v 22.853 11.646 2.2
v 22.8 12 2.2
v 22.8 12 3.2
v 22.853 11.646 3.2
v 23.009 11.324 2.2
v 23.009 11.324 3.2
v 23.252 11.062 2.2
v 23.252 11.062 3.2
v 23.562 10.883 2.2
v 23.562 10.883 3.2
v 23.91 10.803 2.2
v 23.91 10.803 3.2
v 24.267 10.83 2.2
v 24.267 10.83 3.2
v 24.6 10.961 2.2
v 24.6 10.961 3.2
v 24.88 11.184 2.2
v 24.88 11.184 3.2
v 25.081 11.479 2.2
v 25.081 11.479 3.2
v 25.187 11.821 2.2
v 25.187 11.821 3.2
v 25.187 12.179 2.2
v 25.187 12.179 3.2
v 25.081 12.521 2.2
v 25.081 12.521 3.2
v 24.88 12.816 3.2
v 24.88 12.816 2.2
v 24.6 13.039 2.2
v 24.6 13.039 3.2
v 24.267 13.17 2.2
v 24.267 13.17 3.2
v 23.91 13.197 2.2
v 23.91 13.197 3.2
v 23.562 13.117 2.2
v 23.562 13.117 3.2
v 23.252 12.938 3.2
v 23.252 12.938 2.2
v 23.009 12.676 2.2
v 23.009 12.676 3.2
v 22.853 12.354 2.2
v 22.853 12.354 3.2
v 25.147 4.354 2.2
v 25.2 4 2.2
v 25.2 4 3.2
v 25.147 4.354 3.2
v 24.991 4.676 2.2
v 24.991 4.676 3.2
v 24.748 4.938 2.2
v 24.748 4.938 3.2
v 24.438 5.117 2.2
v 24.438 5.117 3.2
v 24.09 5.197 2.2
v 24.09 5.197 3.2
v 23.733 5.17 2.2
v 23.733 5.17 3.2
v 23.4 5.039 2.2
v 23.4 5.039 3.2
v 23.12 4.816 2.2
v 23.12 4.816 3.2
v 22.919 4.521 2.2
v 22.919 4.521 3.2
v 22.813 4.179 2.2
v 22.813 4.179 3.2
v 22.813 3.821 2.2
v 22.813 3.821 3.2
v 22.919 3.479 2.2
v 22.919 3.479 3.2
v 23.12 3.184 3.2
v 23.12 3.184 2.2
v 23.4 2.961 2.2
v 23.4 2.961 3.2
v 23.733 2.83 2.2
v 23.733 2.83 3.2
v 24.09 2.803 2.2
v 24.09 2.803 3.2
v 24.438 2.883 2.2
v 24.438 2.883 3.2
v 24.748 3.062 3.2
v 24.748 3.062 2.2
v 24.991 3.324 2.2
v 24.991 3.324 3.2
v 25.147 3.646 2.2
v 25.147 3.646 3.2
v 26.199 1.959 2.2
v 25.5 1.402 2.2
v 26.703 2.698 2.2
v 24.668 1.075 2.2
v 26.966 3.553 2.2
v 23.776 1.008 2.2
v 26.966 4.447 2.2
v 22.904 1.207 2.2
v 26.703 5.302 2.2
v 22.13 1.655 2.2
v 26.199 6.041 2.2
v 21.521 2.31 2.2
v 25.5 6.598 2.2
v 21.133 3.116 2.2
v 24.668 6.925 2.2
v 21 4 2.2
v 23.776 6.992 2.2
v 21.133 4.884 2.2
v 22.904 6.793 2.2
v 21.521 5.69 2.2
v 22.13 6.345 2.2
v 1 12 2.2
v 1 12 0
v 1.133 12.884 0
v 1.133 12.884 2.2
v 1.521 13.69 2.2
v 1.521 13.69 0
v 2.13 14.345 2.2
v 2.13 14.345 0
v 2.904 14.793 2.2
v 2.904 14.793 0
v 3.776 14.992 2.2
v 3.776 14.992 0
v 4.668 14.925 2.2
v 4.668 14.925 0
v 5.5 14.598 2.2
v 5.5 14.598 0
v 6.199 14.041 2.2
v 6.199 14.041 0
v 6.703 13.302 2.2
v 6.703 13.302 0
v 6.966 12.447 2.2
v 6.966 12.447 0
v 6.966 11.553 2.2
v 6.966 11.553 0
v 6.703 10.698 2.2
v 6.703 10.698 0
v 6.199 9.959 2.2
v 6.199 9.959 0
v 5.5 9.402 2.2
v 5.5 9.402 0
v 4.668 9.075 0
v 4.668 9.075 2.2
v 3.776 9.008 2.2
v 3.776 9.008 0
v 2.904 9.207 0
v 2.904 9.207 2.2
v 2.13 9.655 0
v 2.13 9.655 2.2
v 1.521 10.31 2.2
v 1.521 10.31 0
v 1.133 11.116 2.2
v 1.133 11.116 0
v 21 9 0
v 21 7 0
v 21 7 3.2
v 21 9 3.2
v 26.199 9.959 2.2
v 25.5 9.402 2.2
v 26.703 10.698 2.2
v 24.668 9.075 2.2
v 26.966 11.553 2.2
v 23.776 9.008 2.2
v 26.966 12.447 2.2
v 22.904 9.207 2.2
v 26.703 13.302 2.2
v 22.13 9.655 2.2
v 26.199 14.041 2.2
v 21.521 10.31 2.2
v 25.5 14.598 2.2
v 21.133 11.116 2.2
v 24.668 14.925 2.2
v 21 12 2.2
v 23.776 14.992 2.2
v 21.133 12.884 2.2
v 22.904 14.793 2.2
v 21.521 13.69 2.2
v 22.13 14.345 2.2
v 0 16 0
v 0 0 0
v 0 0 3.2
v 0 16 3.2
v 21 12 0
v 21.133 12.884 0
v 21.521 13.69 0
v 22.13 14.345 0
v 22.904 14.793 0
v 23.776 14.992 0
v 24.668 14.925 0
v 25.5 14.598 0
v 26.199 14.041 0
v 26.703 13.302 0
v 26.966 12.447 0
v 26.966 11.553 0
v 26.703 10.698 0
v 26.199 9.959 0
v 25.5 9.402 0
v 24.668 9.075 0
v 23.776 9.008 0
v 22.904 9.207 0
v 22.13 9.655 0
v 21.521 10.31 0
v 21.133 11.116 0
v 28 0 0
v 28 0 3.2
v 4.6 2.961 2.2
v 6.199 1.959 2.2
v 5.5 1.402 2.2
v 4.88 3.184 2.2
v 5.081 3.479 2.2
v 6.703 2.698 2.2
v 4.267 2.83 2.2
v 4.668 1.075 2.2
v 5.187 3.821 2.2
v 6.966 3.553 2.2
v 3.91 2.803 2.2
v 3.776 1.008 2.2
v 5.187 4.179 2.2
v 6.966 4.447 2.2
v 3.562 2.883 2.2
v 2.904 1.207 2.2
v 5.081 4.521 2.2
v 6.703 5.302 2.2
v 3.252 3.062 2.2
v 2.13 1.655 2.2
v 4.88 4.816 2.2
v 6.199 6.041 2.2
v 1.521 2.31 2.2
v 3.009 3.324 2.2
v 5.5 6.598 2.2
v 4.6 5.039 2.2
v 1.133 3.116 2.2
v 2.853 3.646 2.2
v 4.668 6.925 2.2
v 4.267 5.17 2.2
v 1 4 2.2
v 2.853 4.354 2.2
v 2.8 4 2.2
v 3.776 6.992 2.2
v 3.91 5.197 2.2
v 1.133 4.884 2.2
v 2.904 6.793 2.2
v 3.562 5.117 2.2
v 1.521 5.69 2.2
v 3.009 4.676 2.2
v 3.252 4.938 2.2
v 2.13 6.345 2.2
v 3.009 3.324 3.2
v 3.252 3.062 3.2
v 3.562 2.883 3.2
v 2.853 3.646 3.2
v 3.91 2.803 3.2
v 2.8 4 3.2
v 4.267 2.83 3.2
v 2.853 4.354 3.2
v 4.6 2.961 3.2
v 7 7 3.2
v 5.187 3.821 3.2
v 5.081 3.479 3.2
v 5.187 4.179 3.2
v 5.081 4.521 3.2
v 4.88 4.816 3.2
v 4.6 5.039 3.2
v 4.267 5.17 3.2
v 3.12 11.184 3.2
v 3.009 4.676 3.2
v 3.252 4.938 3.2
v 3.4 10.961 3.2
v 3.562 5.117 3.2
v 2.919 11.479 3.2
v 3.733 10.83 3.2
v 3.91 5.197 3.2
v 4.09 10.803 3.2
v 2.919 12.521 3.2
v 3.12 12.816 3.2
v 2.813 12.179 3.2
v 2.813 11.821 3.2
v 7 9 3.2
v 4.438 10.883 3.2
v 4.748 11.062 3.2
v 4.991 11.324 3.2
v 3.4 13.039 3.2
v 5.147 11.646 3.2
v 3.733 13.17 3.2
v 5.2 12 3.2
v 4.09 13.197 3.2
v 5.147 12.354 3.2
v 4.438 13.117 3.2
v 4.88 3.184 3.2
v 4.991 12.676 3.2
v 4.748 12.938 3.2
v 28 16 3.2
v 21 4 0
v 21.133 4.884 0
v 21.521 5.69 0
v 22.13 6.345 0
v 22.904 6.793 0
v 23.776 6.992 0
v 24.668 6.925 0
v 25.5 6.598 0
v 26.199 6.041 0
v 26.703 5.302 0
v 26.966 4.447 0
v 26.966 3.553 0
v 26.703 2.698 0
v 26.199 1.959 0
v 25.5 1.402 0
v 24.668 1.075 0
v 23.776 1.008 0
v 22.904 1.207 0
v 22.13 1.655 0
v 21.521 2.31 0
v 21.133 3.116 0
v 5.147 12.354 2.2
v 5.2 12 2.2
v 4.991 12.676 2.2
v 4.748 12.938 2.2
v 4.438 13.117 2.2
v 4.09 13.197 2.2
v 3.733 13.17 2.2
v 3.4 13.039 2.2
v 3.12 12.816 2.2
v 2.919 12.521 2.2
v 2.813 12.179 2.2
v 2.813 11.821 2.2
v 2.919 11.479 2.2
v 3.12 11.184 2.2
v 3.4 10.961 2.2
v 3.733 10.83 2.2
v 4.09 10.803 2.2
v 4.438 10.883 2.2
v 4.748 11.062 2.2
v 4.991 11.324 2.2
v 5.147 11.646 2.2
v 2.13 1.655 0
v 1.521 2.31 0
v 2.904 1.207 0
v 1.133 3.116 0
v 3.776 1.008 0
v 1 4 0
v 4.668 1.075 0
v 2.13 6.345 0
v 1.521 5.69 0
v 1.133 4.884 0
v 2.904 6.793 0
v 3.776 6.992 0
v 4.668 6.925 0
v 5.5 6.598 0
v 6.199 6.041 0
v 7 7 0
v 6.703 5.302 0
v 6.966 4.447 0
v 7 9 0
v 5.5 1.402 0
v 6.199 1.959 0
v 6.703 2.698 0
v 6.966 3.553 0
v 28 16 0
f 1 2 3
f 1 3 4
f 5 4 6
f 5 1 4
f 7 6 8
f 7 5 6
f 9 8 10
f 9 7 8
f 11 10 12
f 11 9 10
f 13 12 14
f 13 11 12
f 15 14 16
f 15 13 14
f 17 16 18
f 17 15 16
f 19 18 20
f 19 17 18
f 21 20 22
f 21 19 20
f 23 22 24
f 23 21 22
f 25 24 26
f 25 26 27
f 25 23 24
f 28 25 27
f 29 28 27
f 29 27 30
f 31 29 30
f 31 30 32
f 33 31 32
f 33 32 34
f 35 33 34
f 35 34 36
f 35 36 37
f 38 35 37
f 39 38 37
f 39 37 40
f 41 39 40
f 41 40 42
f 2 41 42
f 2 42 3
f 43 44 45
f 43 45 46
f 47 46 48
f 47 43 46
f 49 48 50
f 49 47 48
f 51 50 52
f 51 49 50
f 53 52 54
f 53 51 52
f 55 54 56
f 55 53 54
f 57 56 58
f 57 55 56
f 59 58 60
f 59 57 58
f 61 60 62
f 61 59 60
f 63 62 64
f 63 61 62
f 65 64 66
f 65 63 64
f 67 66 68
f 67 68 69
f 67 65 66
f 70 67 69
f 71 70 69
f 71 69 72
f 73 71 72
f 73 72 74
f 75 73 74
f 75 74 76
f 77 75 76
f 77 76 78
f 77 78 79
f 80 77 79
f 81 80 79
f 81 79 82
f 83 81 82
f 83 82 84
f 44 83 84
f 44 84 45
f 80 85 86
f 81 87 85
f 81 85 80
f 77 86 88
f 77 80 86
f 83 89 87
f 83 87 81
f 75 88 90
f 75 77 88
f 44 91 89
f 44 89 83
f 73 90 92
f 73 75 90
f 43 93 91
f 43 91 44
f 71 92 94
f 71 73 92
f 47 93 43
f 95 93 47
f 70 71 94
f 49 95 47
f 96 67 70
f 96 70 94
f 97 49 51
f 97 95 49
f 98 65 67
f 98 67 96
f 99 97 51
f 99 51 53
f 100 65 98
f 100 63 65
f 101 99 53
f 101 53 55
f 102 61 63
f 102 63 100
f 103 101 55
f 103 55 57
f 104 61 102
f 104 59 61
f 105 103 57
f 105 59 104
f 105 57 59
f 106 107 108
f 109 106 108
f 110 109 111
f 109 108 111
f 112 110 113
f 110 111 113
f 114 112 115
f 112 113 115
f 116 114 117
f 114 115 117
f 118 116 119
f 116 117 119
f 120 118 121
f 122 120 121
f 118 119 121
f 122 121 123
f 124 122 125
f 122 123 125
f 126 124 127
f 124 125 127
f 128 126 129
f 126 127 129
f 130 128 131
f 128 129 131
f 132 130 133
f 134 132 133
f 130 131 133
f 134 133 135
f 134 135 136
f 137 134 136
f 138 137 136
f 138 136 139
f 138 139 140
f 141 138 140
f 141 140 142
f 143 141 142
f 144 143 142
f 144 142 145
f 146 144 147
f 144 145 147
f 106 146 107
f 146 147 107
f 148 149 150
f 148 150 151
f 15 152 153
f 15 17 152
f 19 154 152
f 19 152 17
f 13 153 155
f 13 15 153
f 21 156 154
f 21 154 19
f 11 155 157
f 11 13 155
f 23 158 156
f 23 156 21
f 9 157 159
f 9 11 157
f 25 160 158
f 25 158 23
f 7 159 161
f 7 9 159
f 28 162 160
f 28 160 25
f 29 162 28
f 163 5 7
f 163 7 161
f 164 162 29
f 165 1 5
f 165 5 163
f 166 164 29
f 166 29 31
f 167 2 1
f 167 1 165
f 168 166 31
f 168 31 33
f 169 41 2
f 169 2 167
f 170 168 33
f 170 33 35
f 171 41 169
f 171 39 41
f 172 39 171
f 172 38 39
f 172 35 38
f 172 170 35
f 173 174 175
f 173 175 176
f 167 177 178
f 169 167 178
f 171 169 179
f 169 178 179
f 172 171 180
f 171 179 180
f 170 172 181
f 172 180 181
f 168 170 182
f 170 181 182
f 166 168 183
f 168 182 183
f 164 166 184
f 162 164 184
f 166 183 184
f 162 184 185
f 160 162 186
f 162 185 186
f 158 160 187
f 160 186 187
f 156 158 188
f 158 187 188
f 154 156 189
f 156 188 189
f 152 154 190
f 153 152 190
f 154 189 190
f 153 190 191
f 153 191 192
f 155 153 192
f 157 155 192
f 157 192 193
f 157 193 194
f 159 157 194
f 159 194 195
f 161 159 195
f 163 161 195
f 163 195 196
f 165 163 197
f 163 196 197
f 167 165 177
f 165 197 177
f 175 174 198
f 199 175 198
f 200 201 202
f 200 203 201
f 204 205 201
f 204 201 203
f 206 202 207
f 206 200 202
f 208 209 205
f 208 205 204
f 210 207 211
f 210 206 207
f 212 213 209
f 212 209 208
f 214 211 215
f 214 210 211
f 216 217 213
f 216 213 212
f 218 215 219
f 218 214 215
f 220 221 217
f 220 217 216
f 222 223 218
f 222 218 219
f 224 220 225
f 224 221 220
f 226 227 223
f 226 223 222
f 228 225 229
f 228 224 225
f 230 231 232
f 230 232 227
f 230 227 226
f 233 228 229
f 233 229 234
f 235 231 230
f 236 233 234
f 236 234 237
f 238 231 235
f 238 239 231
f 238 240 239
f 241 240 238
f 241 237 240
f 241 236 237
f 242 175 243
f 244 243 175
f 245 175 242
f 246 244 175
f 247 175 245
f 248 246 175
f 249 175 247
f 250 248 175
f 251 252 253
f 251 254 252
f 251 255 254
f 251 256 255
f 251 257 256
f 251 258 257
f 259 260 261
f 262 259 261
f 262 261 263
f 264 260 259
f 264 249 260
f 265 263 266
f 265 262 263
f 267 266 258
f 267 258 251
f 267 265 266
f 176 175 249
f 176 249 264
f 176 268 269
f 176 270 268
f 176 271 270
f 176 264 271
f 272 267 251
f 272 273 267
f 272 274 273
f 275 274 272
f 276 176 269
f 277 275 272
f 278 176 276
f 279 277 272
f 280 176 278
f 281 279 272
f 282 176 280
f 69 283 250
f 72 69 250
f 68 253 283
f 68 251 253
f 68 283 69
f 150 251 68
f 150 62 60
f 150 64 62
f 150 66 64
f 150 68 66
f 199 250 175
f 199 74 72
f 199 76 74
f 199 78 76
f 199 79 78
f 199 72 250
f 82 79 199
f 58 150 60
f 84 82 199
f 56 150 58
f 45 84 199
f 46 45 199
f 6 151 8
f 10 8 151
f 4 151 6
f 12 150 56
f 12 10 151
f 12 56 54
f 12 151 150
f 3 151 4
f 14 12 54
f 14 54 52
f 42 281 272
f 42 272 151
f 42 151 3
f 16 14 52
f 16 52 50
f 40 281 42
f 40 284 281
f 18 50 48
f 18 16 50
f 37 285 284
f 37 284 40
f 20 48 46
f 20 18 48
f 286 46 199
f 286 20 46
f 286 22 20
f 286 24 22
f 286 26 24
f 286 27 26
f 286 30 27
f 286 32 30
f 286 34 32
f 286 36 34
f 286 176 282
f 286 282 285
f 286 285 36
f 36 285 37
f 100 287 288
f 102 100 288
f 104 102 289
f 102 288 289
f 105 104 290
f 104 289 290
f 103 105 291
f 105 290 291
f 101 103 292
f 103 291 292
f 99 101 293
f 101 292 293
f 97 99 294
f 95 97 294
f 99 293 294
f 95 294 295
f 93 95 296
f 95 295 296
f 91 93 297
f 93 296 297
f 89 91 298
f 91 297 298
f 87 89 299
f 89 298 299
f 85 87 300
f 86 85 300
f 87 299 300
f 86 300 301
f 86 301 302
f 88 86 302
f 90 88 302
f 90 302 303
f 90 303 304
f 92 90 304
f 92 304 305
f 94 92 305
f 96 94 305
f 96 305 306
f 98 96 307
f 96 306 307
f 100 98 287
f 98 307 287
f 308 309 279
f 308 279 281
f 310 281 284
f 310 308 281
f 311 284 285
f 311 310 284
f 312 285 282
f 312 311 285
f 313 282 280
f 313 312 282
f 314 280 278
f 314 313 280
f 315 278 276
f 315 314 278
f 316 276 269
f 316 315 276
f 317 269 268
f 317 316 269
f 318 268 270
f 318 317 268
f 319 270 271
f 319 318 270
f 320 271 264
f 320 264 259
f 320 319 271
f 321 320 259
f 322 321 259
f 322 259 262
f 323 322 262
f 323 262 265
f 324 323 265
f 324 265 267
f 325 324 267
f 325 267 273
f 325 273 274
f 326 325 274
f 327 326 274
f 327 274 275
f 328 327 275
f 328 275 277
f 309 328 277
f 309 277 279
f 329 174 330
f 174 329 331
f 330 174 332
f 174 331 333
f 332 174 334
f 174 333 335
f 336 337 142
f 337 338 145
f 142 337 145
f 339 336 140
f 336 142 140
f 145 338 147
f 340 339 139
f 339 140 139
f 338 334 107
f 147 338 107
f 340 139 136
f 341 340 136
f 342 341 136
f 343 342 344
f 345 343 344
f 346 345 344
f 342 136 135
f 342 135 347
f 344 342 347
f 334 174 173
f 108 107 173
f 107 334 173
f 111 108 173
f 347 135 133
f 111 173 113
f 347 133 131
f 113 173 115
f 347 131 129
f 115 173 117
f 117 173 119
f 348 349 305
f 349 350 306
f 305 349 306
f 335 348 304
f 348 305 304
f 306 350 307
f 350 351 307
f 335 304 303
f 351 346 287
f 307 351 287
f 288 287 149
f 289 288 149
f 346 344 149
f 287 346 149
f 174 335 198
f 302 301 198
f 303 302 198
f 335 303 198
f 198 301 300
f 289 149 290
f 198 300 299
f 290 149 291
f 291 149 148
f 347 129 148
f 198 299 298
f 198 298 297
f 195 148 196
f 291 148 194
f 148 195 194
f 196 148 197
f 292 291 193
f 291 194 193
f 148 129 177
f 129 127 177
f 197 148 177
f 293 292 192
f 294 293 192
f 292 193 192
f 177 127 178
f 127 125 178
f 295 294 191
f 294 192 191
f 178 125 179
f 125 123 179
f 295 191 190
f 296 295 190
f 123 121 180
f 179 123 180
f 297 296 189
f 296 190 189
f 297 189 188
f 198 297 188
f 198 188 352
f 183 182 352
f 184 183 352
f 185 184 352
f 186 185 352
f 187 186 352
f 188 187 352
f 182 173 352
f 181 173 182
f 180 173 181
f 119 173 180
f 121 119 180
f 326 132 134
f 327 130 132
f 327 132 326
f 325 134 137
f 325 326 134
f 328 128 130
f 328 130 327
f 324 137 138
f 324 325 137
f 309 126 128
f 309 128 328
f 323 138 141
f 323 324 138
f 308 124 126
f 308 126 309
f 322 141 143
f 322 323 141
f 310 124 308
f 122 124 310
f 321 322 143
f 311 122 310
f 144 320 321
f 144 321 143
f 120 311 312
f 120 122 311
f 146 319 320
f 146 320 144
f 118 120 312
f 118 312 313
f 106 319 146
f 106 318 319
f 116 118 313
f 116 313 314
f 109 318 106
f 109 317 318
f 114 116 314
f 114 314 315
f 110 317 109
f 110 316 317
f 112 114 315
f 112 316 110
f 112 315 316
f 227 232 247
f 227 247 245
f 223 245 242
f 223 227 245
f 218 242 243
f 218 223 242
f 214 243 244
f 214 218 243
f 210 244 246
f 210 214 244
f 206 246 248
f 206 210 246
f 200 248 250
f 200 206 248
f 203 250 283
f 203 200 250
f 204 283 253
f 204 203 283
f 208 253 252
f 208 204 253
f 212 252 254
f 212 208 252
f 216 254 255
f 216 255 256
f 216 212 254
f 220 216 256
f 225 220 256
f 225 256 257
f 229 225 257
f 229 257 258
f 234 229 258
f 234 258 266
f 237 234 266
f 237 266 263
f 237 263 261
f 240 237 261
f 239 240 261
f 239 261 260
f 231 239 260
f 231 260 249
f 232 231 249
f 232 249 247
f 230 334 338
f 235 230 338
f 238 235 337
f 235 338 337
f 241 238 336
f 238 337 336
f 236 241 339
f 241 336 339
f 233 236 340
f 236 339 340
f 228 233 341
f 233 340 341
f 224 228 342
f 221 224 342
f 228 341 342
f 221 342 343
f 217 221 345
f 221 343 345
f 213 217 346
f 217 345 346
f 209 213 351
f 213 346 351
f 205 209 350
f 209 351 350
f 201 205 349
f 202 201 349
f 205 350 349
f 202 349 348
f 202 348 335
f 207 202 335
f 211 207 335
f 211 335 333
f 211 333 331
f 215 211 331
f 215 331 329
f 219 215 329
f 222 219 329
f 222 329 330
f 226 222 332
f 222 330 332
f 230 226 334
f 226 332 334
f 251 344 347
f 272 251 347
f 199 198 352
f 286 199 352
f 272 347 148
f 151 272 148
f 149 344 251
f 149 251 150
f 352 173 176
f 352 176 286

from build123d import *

# Parameters (mm, degrees)
SKETCH1_W           = 28
SKETCH1_H           = 16
SKETCH1_R           = 1.2
SKETCH1_W_2         = 14
SKETCH1_H_2         = 2
BOSS_EXTRUDE1_DEPTH = 3.2
SKETCH2_R           = 3
CUT_EXTRUDE1_DEPTH  = 2.2


with BuildPart() as part:
    # Sketch1 → Boss-Extrude1 (new body)
    with BuildSketch(Plane.XY):
        with Locations((14, 8)):
            Rectangle(SKETCH1_W, SKETCH1_H)
        with Locations((4, 12)):
            Circle(SKETCH1_R, mode=Mode.SUBTRACT)
        with Locations(Location((4, 4, 0), (0, 0, 180))):
            Circle(SKETCH1_R, mode=Mode.SUBTRACT)
        with Locations((24, 4)):
            Circle(SKETCH1_R, mode=Mode.SUBTRACT)
        with Locations(Location((24, 12, 0), (0, 0, 180))):
            Circle(SKETCH1_R, mode=Mode.SUBTRACT)
        with Locations((14, 8)):
            Rectangle(SKETCH1_W_2, SKETCH1_H_2, mode=Mode.SUBTRACT)
    extrude(amount=BOSS_EXTRUDE1_DEPTH)

    # Sketch2 → Cut-Extrude1 (cut)
    with BuildSketch(Plane(origin=(0, 0, 0), x_dir=(-1, 0, 0), z_dir=(0, 0, -1))):
        with Locations((-4, 12)):
            Circle(SKETCH2_R)
        with Locations((-4, 4)):
            Circle(SKETCH2_R)
        with Locations((-24, 4)):
            Circle(SKETCH2_R)
        with Locations((-24, 12)):
            Circle(SKETCH2_R)
    extrude(amount=-CUT_EXTRUDE1_DEPTH, mode=Mode.SUBTRACT)


solid = part.part
